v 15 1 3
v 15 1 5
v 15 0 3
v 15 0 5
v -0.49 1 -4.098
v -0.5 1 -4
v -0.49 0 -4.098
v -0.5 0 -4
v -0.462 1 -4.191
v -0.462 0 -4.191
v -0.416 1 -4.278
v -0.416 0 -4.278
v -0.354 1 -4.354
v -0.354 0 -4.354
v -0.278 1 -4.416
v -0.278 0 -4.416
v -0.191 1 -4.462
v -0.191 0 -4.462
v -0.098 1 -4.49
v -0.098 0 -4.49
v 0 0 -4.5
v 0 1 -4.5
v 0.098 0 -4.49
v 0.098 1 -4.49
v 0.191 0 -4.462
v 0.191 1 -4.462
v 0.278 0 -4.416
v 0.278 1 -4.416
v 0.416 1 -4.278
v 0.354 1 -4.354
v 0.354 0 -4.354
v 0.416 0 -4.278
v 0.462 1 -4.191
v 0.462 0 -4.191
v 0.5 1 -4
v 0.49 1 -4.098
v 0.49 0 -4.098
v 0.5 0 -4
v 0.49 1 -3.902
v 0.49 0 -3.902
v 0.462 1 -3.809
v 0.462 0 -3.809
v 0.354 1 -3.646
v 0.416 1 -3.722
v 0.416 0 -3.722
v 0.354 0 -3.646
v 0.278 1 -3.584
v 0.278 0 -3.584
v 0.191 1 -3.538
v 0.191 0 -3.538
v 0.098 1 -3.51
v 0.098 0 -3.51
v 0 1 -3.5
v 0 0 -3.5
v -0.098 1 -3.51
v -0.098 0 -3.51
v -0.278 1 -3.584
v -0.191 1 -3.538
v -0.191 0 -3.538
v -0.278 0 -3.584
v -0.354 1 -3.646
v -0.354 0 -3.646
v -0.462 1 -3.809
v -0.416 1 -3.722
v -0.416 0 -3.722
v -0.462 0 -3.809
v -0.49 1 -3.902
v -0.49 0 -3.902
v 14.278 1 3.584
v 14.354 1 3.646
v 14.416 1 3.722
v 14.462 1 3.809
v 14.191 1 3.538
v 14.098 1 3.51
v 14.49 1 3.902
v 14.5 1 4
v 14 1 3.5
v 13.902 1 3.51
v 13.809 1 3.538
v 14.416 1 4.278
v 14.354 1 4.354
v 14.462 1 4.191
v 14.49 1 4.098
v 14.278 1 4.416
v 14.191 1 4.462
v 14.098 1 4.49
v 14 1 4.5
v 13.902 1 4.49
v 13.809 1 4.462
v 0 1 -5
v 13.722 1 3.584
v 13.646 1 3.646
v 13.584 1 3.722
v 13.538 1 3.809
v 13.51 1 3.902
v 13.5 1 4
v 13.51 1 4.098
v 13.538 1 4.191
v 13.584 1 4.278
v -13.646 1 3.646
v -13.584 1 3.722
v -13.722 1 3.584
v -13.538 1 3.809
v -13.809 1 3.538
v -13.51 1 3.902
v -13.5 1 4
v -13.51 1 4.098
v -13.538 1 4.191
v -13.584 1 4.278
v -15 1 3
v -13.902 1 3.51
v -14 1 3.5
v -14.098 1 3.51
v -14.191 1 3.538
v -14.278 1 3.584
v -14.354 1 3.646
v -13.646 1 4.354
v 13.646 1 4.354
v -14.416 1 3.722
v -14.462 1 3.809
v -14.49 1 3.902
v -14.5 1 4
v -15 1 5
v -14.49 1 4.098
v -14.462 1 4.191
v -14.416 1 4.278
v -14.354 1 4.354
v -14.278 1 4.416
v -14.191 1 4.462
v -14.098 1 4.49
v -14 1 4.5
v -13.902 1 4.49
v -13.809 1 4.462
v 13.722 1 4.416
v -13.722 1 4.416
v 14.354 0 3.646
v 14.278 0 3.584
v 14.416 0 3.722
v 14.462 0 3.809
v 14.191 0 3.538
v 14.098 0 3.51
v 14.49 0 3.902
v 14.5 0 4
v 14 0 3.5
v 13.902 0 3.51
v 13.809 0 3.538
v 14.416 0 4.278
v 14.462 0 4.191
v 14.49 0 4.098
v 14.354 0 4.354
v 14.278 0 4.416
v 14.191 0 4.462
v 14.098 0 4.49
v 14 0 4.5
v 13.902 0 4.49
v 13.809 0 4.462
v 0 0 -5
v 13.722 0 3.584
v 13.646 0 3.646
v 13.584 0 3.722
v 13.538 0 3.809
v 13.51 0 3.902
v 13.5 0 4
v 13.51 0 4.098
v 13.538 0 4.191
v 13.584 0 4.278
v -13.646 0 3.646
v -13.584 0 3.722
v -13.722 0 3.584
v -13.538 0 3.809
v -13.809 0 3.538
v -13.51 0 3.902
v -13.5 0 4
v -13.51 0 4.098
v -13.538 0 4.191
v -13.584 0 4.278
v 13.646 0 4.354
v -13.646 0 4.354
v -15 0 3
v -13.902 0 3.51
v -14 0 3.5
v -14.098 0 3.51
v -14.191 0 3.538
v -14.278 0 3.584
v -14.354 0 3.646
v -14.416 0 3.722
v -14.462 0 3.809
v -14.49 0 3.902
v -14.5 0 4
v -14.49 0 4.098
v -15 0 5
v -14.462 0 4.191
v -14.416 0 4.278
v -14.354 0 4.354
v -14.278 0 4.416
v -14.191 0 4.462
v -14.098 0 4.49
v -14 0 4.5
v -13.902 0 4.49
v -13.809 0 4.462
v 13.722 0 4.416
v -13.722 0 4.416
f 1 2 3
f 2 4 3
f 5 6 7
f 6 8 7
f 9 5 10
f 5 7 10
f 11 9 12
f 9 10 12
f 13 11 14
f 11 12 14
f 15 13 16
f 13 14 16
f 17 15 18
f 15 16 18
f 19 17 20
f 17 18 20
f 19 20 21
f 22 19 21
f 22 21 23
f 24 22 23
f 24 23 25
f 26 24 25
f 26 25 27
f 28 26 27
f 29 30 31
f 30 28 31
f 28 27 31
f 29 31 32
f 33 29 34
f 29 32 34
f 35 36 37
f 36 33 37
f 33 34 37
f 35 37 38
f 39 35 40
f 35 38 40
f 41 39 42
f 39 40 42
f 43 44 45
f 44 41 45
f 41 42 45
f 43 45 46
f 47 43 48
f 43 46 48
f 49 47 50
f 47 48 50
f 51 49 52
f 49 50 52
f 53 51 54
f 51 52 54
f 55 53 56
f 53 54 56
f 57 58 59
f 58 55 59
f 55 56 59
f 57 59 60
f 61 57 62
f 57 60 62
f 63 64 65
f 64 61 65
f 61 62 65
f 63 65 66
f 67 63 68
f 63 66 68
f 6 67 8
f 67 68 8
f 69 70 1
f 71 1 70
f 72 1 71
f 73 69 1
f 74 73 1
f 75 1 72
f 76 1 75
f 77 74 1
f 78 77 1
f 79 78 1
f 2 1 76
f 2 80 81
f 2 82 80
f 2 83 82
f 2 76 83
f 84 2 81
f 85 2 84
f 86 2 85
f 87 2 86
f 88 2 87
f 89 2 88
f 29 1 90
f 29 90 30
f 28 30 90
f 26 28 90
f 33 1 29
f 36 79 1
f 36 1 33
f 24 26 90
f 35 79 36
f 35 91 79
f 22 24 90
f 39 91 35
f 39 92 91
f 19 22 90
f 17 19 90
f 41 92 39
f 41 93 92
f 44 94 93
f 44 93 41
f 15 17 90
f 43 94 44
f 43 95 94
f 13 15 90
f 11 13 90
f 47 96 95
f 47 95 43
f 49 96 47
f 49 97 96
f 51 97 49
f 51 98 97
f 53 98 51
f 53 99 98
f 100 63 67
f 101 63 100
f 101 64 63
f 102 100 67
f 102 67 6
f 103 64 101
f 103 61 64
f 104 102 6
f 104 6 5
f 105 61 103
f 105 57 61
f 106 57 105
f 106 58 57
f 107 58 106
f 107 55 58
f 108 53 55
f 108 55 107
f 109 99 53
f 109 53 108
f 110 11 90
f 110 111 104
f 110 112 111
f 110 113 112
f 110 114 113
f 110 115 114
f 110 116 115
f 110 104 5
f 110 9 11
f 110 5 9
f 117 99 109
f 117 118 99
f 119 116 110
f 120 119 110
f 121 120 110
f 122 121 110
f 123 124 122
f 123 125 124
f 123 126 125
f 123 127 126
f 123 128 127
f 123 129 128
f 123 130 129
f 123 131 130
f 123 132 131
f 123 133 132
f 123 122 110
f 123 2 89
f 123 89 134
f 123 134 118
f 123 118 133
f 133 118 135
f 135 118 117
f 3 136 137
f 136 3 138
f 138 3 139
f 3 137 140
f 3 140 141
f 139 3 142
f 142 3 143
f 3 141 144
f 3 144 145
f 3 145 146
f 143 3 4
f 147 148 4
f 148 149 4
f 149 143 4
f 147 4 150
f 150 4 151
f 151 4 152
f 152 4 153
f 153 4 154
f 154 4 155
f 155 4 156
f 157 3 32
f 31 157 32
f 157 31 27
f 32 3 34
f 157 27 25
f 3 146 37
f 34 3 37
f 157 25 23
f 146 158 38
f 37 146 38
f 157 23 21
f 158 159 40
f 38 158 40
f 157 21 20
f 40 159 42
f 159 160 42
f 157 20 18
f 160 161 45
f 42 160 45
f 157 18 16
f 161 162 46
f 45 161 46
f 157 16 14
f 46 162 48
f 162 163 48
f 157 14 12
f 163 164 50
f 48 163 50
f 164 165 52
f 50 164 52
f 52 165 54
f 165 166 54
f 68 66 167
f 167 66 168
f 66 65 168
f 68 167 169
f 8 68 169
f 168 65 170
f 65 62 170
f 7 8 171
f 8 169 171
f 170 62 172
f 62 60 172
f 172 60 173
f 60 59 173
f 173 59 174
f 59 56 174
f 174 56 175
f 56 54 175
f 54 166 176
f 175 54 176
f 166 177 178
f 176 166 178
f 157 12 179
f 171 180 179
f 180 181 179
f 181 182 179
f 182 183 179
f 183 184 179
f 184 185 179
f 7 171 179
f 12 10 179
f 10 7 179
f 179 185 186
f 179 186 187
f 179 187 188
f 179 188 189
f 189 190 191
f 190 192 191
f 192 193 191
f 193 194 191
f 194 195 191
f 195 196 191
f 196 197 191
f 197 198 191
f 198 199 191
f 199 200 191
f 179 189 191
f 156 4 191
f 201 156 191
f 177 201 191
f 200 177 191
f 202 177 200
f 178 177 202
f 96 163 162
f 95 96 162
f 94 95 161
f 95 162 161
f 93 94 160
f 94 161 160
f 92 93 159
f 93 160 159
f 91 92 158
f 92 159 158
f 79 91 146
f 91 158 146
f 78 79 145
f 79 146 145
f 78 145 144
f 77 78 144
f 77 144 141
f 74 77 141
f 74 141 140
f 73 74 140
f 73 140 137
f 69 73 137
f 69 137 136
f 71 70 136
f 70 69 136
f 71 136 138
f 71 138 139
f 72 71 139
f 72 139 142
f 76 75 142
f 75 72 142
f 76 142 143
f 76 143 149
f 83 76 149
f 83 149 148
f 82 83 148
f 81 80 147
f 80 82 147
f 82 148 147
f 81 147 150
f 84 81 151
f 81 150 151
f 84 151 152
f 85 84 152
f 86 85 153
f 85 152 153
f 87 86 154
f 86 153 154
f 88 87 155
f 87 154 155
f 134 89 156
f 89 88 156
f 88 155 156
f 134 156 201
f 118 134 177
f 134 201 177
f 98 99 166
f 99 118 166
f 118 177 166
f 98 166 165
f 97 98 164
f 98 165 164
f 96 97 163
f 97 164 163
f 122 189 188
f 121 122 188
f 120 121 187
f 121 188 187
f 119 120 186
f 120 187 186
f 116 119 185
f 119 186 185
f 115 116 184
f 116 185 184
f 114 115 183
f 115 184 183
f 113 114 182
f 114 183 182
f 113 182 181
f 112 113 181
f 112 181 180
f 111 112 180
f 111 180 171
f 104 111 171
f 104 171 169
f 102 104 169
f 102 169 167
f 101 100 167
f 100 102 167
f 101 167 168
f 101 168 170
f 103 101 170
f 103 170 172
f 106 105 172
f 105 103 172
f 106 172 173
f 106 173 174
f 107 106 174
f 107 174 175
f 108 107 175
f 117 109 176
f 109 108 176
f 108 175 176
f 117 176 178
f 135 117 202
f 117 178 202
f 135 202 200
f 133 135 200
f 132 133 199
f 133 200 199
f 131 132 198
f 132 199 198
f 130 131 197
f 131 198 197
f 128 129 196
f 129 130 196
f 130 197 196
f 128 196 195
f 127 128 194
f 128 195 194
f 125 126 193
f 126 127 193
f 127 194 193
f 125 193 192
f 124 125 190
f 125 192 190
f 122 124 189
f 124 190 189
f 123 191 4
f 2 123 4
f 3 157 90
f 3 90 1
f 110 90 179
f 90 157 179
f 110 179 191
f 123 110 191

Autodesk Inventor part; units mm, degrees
ref_plane "YZ Plane" through (0, 0, 0) normal (1, 0, 0) x (0, 1, 0)
ref_plane "XZ Plane" through (0, 0, 0) normal (0, 1, 0) x (-1, 0, 0)
ref_plane "XY Plane" through (0, 0, 0) normal (0, 0, 1) x (1, 0, 0)
sketch "Sketch1" plane through (0, 0, 0) normal (0, 1, 0) x (-1, 0, 0)
  line L0 (15, 5) -> (-15, 5)
  line L1 (-15, 5) -> (-15, -5)
  line L2 (-15, -5) -> (15, -5)
  line L3 (15, -5) -> (15, 5)
  line L4 (15, 5) -> (-15, -5) construction
  line L5 (-15, 5) -> (15, -5) construction
  circle A0 centre (0, -4) radius 0.5
  line L6 (0, -5) -> (-15, 3)
  line L7 (0, -5) -> (15, 3)
  circle A1 centre (-14, 4) radius 0.5
  circle A2 centre (14, 4) radius 0.5
  point P0 (0, 0)
  dimension "d0" = 30
  dimension "d1" = 10
  dimension "d2" = 1
  dimension "d3" = 1
  dimension "d4" = 2
  dimension "d5" = 2
  dimension "d6" = 1
  dimension "d7" = 1
  dimension "d8" = 1
  dimension "d9" = 1
  dimension "d10" = 1
  dimension "d11" = 1
extrude "Extrusion1" add sketch "Sketch1" along normal blind 1 contours L3 L7 L6 L1 L0
properties part number "bar"
